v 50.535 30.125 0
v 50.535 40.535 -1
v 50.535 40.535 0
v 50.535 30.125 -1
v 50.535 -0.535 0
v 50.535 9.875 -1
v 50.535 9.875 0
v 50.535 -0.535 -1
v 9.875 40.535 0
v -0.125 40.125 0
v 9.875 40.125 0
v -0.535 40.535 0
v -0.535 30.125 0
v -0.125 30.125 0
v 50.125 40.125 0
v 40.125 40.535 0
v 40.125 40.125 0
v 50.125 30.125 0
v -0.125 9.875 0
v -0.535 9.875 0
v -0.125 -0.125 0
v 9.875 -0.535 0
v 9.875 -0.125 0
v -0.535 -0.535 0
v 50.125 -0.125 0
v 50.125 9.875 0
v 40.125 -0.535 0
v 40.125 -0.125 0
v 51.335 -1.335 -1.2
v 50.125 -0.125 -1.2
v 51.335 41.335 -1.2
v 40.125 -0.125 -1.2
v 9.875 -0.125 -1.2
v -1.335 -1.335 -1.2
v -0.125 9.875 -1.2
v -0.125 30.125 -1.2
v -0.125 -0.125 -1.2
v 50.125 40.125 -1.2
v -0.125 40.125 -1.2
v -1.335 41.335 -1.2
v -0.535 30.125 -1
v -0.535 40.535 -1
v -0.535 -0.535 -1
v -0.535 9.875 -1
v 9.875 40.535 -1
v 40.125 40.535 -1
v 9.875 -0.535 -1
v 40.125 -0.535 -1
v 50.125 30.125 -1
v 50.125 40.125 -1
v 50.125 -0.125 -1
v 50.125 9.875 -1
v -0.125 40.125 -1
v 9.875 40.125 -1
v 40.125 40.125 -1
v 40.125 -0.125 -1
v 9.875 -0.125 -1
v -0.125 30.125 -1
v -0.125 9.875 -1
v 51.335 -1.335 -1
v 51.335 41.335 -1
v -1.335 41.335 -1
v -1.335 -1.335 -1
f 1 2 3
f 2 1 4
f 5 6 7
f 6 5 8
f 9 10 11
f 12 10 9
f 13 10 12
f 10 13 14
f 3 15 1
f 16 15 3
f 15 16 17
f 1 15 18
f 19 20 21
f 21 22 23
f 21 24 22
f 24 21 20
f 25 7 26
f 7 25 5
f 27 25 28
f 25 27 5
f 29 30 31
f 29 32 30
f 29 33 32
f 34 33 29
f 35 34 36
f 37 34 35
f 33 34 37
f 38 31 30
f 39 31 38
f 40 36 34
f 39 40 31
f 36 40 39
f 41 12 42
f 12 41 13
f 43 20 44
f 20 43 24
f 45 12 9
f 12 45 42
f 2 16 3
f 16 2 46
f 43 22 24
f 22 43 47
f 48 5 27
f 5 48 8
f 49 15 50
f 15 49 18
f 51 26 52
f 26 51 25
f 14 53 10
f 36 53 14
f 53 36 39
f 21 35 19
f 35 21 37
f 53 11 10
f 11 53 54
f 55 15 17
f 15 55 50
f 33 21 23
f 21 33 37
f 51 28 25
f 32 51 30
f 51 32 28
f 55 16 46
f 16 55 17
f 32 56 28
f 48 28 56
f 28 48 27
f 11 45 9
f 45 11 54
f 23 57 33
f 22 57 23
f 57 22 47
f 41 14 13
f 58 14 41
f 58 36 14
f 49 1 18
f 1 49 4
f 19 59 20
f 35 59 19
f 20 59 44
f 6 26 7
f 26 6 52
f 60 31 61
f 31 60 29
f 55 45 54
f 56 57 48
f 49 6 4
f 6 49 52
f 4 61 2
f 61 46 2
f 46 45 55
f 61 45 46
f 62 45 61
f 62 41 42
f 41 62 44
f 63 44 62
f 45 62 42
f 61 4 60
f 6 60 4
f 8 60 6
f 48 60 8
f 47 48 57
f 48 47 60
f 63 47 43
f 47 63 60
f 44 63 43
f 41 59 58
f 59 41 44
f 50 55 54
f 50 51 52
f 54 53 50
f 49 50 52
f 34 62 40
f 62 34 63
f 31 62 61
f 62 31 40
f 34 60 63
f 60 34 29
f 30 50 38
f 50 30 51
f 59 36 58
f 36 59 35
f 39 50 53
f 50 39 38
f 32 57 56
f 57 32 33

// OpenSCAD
BORDER_WIDTH = .1;
INTERLOCK_TOLERANCE = .125;
HOLDER_BORDER_WIDTH = .41; //.8
SLIDE_Z_OFFSET = 1.20;
//SLIDE_Z_OFFSET = 0;
BORDER_HEIGHT = 1.20;
HOLDER_SKIRT_WIDTH = .8;
HOLDER_SKIRT_HEIGHT = .2;
HOLDER_COLOR = [.5,.5,.5,1];
SLIDE_COLOR = [.75,.75,1,.5];
CORNER_DISTANCE = 10; //mm

module slide_holder_skirt(width, height)
{
	translate([-HOLDER_BORDER_WIDTH-INTERLOCK_TOLERANCE-HOLDER_SKIRT_WIDTH, -HOLDER_BORDER_WIDTH - INTERLOCK_TOLERANCE - HOLDER_SKIRT_WIDTH, -SLIDE_Z_OFFSET])
	{
		difference()
		{
			cube([width+INTERLOCK_TOLERANCE*2 + HOLDER_BORDER_WIDTH*2 + HOLDER_SKIRT_WIDTH*2, height+INTERLOCK_TOLERANCE*2 + HOLDER_BORDER_WIDTH*2 + HOLDER_SKIRT_WIDTH*2, HOLDER_SKIRT_HEIGHT]);
			translate([HOLDER_BORDER_WIDTH + HOLDER_SKIRT_WIDTH, HOLDER_BORDER_WIDTH + HOLDER_SKIRT_WIDTH, -.5])
			{
				cube([width+INTERLOCK_TOLERANCE*2, height+INTERLOCK_TOLERANCE*2, BORDER_HEIGHT+1]);
			}
		}
	}
}

module single_slide_holder(width, height)
{
	translate([-HOLDER_BORDER_WIDTH-INTERLOCK_TOLERANCE,-HOLDER_BORDER_WIDTH -INTERLOCK_TOLERANCE,-SLIDE_Z_OFFSET])
	{
		difference()
		{
			cube([width+INTERLOCK_TOLERANCE*2 + HOLDER_BORDER_WIDTH*2, height+INTERLOCK_TOLERANCE*2 + HOLDER_BORDER_WIDTH*2, BORDER_HEIGHT]);
			translate([HOLDER_BORDER_WIDTH, HOLDER_BORDER_WIDTH, -.5])
			{
				cube([width+INTERLOCK_TOLERANCE*2, height+INTERLOCK_TOLERANCE*2, BORDER_HEIGHT+1]);
			}
            translate([CORNER_DISTANCE + HOLDER_BORDER_WIDTH, -HOLDER_BORDER_WIDTH, -.5]){
                cube([width + INTERLOCK_TOLERANCE*2 - CORNER_DISTANCE*2, height+ INTERLOCK_TOLERANCE*2 + HOLDER_BORDER_WIDTH*4 , BORDER_HEIGHT+1]);
            }
            translate([-HOLDER_BORDER_WIDTH, HOLDER_BORDER_WIDTH + CORNER_DISTANCE, -.5]){
                cube([width + INTERLOCK_TOLERANCE*2 + HOLDER_BORDER_WIDTH*4, height+ INTERLOCK_TOLERANCE*2 - CORNER_DISTANCE*2 , BORDER_HEIGHT+1]);
            }
		}
	}
}

module PDMS_mockup(width,height){

	
	difference(){
		translate([0,0,.01]){
			cube([width,height,2.48]);
		}
			allComponents();
	}
	
}

module slide_mockup(width,height){
	translate([0,0,-SLIDE_Z_OFFSET]){
		cube([width, height, SLIDE_Z_OFFSET]);
	}
}

module preset_mold(width, height){
    color(HOLDER_COLOR)
    {
    single_slide_holder(width, height);
	slide_holder_skirt(width,height);
    }
	color(SLIDE_COLOR) %slide_mockup(width,height);
}


preset_mold(50,40);
